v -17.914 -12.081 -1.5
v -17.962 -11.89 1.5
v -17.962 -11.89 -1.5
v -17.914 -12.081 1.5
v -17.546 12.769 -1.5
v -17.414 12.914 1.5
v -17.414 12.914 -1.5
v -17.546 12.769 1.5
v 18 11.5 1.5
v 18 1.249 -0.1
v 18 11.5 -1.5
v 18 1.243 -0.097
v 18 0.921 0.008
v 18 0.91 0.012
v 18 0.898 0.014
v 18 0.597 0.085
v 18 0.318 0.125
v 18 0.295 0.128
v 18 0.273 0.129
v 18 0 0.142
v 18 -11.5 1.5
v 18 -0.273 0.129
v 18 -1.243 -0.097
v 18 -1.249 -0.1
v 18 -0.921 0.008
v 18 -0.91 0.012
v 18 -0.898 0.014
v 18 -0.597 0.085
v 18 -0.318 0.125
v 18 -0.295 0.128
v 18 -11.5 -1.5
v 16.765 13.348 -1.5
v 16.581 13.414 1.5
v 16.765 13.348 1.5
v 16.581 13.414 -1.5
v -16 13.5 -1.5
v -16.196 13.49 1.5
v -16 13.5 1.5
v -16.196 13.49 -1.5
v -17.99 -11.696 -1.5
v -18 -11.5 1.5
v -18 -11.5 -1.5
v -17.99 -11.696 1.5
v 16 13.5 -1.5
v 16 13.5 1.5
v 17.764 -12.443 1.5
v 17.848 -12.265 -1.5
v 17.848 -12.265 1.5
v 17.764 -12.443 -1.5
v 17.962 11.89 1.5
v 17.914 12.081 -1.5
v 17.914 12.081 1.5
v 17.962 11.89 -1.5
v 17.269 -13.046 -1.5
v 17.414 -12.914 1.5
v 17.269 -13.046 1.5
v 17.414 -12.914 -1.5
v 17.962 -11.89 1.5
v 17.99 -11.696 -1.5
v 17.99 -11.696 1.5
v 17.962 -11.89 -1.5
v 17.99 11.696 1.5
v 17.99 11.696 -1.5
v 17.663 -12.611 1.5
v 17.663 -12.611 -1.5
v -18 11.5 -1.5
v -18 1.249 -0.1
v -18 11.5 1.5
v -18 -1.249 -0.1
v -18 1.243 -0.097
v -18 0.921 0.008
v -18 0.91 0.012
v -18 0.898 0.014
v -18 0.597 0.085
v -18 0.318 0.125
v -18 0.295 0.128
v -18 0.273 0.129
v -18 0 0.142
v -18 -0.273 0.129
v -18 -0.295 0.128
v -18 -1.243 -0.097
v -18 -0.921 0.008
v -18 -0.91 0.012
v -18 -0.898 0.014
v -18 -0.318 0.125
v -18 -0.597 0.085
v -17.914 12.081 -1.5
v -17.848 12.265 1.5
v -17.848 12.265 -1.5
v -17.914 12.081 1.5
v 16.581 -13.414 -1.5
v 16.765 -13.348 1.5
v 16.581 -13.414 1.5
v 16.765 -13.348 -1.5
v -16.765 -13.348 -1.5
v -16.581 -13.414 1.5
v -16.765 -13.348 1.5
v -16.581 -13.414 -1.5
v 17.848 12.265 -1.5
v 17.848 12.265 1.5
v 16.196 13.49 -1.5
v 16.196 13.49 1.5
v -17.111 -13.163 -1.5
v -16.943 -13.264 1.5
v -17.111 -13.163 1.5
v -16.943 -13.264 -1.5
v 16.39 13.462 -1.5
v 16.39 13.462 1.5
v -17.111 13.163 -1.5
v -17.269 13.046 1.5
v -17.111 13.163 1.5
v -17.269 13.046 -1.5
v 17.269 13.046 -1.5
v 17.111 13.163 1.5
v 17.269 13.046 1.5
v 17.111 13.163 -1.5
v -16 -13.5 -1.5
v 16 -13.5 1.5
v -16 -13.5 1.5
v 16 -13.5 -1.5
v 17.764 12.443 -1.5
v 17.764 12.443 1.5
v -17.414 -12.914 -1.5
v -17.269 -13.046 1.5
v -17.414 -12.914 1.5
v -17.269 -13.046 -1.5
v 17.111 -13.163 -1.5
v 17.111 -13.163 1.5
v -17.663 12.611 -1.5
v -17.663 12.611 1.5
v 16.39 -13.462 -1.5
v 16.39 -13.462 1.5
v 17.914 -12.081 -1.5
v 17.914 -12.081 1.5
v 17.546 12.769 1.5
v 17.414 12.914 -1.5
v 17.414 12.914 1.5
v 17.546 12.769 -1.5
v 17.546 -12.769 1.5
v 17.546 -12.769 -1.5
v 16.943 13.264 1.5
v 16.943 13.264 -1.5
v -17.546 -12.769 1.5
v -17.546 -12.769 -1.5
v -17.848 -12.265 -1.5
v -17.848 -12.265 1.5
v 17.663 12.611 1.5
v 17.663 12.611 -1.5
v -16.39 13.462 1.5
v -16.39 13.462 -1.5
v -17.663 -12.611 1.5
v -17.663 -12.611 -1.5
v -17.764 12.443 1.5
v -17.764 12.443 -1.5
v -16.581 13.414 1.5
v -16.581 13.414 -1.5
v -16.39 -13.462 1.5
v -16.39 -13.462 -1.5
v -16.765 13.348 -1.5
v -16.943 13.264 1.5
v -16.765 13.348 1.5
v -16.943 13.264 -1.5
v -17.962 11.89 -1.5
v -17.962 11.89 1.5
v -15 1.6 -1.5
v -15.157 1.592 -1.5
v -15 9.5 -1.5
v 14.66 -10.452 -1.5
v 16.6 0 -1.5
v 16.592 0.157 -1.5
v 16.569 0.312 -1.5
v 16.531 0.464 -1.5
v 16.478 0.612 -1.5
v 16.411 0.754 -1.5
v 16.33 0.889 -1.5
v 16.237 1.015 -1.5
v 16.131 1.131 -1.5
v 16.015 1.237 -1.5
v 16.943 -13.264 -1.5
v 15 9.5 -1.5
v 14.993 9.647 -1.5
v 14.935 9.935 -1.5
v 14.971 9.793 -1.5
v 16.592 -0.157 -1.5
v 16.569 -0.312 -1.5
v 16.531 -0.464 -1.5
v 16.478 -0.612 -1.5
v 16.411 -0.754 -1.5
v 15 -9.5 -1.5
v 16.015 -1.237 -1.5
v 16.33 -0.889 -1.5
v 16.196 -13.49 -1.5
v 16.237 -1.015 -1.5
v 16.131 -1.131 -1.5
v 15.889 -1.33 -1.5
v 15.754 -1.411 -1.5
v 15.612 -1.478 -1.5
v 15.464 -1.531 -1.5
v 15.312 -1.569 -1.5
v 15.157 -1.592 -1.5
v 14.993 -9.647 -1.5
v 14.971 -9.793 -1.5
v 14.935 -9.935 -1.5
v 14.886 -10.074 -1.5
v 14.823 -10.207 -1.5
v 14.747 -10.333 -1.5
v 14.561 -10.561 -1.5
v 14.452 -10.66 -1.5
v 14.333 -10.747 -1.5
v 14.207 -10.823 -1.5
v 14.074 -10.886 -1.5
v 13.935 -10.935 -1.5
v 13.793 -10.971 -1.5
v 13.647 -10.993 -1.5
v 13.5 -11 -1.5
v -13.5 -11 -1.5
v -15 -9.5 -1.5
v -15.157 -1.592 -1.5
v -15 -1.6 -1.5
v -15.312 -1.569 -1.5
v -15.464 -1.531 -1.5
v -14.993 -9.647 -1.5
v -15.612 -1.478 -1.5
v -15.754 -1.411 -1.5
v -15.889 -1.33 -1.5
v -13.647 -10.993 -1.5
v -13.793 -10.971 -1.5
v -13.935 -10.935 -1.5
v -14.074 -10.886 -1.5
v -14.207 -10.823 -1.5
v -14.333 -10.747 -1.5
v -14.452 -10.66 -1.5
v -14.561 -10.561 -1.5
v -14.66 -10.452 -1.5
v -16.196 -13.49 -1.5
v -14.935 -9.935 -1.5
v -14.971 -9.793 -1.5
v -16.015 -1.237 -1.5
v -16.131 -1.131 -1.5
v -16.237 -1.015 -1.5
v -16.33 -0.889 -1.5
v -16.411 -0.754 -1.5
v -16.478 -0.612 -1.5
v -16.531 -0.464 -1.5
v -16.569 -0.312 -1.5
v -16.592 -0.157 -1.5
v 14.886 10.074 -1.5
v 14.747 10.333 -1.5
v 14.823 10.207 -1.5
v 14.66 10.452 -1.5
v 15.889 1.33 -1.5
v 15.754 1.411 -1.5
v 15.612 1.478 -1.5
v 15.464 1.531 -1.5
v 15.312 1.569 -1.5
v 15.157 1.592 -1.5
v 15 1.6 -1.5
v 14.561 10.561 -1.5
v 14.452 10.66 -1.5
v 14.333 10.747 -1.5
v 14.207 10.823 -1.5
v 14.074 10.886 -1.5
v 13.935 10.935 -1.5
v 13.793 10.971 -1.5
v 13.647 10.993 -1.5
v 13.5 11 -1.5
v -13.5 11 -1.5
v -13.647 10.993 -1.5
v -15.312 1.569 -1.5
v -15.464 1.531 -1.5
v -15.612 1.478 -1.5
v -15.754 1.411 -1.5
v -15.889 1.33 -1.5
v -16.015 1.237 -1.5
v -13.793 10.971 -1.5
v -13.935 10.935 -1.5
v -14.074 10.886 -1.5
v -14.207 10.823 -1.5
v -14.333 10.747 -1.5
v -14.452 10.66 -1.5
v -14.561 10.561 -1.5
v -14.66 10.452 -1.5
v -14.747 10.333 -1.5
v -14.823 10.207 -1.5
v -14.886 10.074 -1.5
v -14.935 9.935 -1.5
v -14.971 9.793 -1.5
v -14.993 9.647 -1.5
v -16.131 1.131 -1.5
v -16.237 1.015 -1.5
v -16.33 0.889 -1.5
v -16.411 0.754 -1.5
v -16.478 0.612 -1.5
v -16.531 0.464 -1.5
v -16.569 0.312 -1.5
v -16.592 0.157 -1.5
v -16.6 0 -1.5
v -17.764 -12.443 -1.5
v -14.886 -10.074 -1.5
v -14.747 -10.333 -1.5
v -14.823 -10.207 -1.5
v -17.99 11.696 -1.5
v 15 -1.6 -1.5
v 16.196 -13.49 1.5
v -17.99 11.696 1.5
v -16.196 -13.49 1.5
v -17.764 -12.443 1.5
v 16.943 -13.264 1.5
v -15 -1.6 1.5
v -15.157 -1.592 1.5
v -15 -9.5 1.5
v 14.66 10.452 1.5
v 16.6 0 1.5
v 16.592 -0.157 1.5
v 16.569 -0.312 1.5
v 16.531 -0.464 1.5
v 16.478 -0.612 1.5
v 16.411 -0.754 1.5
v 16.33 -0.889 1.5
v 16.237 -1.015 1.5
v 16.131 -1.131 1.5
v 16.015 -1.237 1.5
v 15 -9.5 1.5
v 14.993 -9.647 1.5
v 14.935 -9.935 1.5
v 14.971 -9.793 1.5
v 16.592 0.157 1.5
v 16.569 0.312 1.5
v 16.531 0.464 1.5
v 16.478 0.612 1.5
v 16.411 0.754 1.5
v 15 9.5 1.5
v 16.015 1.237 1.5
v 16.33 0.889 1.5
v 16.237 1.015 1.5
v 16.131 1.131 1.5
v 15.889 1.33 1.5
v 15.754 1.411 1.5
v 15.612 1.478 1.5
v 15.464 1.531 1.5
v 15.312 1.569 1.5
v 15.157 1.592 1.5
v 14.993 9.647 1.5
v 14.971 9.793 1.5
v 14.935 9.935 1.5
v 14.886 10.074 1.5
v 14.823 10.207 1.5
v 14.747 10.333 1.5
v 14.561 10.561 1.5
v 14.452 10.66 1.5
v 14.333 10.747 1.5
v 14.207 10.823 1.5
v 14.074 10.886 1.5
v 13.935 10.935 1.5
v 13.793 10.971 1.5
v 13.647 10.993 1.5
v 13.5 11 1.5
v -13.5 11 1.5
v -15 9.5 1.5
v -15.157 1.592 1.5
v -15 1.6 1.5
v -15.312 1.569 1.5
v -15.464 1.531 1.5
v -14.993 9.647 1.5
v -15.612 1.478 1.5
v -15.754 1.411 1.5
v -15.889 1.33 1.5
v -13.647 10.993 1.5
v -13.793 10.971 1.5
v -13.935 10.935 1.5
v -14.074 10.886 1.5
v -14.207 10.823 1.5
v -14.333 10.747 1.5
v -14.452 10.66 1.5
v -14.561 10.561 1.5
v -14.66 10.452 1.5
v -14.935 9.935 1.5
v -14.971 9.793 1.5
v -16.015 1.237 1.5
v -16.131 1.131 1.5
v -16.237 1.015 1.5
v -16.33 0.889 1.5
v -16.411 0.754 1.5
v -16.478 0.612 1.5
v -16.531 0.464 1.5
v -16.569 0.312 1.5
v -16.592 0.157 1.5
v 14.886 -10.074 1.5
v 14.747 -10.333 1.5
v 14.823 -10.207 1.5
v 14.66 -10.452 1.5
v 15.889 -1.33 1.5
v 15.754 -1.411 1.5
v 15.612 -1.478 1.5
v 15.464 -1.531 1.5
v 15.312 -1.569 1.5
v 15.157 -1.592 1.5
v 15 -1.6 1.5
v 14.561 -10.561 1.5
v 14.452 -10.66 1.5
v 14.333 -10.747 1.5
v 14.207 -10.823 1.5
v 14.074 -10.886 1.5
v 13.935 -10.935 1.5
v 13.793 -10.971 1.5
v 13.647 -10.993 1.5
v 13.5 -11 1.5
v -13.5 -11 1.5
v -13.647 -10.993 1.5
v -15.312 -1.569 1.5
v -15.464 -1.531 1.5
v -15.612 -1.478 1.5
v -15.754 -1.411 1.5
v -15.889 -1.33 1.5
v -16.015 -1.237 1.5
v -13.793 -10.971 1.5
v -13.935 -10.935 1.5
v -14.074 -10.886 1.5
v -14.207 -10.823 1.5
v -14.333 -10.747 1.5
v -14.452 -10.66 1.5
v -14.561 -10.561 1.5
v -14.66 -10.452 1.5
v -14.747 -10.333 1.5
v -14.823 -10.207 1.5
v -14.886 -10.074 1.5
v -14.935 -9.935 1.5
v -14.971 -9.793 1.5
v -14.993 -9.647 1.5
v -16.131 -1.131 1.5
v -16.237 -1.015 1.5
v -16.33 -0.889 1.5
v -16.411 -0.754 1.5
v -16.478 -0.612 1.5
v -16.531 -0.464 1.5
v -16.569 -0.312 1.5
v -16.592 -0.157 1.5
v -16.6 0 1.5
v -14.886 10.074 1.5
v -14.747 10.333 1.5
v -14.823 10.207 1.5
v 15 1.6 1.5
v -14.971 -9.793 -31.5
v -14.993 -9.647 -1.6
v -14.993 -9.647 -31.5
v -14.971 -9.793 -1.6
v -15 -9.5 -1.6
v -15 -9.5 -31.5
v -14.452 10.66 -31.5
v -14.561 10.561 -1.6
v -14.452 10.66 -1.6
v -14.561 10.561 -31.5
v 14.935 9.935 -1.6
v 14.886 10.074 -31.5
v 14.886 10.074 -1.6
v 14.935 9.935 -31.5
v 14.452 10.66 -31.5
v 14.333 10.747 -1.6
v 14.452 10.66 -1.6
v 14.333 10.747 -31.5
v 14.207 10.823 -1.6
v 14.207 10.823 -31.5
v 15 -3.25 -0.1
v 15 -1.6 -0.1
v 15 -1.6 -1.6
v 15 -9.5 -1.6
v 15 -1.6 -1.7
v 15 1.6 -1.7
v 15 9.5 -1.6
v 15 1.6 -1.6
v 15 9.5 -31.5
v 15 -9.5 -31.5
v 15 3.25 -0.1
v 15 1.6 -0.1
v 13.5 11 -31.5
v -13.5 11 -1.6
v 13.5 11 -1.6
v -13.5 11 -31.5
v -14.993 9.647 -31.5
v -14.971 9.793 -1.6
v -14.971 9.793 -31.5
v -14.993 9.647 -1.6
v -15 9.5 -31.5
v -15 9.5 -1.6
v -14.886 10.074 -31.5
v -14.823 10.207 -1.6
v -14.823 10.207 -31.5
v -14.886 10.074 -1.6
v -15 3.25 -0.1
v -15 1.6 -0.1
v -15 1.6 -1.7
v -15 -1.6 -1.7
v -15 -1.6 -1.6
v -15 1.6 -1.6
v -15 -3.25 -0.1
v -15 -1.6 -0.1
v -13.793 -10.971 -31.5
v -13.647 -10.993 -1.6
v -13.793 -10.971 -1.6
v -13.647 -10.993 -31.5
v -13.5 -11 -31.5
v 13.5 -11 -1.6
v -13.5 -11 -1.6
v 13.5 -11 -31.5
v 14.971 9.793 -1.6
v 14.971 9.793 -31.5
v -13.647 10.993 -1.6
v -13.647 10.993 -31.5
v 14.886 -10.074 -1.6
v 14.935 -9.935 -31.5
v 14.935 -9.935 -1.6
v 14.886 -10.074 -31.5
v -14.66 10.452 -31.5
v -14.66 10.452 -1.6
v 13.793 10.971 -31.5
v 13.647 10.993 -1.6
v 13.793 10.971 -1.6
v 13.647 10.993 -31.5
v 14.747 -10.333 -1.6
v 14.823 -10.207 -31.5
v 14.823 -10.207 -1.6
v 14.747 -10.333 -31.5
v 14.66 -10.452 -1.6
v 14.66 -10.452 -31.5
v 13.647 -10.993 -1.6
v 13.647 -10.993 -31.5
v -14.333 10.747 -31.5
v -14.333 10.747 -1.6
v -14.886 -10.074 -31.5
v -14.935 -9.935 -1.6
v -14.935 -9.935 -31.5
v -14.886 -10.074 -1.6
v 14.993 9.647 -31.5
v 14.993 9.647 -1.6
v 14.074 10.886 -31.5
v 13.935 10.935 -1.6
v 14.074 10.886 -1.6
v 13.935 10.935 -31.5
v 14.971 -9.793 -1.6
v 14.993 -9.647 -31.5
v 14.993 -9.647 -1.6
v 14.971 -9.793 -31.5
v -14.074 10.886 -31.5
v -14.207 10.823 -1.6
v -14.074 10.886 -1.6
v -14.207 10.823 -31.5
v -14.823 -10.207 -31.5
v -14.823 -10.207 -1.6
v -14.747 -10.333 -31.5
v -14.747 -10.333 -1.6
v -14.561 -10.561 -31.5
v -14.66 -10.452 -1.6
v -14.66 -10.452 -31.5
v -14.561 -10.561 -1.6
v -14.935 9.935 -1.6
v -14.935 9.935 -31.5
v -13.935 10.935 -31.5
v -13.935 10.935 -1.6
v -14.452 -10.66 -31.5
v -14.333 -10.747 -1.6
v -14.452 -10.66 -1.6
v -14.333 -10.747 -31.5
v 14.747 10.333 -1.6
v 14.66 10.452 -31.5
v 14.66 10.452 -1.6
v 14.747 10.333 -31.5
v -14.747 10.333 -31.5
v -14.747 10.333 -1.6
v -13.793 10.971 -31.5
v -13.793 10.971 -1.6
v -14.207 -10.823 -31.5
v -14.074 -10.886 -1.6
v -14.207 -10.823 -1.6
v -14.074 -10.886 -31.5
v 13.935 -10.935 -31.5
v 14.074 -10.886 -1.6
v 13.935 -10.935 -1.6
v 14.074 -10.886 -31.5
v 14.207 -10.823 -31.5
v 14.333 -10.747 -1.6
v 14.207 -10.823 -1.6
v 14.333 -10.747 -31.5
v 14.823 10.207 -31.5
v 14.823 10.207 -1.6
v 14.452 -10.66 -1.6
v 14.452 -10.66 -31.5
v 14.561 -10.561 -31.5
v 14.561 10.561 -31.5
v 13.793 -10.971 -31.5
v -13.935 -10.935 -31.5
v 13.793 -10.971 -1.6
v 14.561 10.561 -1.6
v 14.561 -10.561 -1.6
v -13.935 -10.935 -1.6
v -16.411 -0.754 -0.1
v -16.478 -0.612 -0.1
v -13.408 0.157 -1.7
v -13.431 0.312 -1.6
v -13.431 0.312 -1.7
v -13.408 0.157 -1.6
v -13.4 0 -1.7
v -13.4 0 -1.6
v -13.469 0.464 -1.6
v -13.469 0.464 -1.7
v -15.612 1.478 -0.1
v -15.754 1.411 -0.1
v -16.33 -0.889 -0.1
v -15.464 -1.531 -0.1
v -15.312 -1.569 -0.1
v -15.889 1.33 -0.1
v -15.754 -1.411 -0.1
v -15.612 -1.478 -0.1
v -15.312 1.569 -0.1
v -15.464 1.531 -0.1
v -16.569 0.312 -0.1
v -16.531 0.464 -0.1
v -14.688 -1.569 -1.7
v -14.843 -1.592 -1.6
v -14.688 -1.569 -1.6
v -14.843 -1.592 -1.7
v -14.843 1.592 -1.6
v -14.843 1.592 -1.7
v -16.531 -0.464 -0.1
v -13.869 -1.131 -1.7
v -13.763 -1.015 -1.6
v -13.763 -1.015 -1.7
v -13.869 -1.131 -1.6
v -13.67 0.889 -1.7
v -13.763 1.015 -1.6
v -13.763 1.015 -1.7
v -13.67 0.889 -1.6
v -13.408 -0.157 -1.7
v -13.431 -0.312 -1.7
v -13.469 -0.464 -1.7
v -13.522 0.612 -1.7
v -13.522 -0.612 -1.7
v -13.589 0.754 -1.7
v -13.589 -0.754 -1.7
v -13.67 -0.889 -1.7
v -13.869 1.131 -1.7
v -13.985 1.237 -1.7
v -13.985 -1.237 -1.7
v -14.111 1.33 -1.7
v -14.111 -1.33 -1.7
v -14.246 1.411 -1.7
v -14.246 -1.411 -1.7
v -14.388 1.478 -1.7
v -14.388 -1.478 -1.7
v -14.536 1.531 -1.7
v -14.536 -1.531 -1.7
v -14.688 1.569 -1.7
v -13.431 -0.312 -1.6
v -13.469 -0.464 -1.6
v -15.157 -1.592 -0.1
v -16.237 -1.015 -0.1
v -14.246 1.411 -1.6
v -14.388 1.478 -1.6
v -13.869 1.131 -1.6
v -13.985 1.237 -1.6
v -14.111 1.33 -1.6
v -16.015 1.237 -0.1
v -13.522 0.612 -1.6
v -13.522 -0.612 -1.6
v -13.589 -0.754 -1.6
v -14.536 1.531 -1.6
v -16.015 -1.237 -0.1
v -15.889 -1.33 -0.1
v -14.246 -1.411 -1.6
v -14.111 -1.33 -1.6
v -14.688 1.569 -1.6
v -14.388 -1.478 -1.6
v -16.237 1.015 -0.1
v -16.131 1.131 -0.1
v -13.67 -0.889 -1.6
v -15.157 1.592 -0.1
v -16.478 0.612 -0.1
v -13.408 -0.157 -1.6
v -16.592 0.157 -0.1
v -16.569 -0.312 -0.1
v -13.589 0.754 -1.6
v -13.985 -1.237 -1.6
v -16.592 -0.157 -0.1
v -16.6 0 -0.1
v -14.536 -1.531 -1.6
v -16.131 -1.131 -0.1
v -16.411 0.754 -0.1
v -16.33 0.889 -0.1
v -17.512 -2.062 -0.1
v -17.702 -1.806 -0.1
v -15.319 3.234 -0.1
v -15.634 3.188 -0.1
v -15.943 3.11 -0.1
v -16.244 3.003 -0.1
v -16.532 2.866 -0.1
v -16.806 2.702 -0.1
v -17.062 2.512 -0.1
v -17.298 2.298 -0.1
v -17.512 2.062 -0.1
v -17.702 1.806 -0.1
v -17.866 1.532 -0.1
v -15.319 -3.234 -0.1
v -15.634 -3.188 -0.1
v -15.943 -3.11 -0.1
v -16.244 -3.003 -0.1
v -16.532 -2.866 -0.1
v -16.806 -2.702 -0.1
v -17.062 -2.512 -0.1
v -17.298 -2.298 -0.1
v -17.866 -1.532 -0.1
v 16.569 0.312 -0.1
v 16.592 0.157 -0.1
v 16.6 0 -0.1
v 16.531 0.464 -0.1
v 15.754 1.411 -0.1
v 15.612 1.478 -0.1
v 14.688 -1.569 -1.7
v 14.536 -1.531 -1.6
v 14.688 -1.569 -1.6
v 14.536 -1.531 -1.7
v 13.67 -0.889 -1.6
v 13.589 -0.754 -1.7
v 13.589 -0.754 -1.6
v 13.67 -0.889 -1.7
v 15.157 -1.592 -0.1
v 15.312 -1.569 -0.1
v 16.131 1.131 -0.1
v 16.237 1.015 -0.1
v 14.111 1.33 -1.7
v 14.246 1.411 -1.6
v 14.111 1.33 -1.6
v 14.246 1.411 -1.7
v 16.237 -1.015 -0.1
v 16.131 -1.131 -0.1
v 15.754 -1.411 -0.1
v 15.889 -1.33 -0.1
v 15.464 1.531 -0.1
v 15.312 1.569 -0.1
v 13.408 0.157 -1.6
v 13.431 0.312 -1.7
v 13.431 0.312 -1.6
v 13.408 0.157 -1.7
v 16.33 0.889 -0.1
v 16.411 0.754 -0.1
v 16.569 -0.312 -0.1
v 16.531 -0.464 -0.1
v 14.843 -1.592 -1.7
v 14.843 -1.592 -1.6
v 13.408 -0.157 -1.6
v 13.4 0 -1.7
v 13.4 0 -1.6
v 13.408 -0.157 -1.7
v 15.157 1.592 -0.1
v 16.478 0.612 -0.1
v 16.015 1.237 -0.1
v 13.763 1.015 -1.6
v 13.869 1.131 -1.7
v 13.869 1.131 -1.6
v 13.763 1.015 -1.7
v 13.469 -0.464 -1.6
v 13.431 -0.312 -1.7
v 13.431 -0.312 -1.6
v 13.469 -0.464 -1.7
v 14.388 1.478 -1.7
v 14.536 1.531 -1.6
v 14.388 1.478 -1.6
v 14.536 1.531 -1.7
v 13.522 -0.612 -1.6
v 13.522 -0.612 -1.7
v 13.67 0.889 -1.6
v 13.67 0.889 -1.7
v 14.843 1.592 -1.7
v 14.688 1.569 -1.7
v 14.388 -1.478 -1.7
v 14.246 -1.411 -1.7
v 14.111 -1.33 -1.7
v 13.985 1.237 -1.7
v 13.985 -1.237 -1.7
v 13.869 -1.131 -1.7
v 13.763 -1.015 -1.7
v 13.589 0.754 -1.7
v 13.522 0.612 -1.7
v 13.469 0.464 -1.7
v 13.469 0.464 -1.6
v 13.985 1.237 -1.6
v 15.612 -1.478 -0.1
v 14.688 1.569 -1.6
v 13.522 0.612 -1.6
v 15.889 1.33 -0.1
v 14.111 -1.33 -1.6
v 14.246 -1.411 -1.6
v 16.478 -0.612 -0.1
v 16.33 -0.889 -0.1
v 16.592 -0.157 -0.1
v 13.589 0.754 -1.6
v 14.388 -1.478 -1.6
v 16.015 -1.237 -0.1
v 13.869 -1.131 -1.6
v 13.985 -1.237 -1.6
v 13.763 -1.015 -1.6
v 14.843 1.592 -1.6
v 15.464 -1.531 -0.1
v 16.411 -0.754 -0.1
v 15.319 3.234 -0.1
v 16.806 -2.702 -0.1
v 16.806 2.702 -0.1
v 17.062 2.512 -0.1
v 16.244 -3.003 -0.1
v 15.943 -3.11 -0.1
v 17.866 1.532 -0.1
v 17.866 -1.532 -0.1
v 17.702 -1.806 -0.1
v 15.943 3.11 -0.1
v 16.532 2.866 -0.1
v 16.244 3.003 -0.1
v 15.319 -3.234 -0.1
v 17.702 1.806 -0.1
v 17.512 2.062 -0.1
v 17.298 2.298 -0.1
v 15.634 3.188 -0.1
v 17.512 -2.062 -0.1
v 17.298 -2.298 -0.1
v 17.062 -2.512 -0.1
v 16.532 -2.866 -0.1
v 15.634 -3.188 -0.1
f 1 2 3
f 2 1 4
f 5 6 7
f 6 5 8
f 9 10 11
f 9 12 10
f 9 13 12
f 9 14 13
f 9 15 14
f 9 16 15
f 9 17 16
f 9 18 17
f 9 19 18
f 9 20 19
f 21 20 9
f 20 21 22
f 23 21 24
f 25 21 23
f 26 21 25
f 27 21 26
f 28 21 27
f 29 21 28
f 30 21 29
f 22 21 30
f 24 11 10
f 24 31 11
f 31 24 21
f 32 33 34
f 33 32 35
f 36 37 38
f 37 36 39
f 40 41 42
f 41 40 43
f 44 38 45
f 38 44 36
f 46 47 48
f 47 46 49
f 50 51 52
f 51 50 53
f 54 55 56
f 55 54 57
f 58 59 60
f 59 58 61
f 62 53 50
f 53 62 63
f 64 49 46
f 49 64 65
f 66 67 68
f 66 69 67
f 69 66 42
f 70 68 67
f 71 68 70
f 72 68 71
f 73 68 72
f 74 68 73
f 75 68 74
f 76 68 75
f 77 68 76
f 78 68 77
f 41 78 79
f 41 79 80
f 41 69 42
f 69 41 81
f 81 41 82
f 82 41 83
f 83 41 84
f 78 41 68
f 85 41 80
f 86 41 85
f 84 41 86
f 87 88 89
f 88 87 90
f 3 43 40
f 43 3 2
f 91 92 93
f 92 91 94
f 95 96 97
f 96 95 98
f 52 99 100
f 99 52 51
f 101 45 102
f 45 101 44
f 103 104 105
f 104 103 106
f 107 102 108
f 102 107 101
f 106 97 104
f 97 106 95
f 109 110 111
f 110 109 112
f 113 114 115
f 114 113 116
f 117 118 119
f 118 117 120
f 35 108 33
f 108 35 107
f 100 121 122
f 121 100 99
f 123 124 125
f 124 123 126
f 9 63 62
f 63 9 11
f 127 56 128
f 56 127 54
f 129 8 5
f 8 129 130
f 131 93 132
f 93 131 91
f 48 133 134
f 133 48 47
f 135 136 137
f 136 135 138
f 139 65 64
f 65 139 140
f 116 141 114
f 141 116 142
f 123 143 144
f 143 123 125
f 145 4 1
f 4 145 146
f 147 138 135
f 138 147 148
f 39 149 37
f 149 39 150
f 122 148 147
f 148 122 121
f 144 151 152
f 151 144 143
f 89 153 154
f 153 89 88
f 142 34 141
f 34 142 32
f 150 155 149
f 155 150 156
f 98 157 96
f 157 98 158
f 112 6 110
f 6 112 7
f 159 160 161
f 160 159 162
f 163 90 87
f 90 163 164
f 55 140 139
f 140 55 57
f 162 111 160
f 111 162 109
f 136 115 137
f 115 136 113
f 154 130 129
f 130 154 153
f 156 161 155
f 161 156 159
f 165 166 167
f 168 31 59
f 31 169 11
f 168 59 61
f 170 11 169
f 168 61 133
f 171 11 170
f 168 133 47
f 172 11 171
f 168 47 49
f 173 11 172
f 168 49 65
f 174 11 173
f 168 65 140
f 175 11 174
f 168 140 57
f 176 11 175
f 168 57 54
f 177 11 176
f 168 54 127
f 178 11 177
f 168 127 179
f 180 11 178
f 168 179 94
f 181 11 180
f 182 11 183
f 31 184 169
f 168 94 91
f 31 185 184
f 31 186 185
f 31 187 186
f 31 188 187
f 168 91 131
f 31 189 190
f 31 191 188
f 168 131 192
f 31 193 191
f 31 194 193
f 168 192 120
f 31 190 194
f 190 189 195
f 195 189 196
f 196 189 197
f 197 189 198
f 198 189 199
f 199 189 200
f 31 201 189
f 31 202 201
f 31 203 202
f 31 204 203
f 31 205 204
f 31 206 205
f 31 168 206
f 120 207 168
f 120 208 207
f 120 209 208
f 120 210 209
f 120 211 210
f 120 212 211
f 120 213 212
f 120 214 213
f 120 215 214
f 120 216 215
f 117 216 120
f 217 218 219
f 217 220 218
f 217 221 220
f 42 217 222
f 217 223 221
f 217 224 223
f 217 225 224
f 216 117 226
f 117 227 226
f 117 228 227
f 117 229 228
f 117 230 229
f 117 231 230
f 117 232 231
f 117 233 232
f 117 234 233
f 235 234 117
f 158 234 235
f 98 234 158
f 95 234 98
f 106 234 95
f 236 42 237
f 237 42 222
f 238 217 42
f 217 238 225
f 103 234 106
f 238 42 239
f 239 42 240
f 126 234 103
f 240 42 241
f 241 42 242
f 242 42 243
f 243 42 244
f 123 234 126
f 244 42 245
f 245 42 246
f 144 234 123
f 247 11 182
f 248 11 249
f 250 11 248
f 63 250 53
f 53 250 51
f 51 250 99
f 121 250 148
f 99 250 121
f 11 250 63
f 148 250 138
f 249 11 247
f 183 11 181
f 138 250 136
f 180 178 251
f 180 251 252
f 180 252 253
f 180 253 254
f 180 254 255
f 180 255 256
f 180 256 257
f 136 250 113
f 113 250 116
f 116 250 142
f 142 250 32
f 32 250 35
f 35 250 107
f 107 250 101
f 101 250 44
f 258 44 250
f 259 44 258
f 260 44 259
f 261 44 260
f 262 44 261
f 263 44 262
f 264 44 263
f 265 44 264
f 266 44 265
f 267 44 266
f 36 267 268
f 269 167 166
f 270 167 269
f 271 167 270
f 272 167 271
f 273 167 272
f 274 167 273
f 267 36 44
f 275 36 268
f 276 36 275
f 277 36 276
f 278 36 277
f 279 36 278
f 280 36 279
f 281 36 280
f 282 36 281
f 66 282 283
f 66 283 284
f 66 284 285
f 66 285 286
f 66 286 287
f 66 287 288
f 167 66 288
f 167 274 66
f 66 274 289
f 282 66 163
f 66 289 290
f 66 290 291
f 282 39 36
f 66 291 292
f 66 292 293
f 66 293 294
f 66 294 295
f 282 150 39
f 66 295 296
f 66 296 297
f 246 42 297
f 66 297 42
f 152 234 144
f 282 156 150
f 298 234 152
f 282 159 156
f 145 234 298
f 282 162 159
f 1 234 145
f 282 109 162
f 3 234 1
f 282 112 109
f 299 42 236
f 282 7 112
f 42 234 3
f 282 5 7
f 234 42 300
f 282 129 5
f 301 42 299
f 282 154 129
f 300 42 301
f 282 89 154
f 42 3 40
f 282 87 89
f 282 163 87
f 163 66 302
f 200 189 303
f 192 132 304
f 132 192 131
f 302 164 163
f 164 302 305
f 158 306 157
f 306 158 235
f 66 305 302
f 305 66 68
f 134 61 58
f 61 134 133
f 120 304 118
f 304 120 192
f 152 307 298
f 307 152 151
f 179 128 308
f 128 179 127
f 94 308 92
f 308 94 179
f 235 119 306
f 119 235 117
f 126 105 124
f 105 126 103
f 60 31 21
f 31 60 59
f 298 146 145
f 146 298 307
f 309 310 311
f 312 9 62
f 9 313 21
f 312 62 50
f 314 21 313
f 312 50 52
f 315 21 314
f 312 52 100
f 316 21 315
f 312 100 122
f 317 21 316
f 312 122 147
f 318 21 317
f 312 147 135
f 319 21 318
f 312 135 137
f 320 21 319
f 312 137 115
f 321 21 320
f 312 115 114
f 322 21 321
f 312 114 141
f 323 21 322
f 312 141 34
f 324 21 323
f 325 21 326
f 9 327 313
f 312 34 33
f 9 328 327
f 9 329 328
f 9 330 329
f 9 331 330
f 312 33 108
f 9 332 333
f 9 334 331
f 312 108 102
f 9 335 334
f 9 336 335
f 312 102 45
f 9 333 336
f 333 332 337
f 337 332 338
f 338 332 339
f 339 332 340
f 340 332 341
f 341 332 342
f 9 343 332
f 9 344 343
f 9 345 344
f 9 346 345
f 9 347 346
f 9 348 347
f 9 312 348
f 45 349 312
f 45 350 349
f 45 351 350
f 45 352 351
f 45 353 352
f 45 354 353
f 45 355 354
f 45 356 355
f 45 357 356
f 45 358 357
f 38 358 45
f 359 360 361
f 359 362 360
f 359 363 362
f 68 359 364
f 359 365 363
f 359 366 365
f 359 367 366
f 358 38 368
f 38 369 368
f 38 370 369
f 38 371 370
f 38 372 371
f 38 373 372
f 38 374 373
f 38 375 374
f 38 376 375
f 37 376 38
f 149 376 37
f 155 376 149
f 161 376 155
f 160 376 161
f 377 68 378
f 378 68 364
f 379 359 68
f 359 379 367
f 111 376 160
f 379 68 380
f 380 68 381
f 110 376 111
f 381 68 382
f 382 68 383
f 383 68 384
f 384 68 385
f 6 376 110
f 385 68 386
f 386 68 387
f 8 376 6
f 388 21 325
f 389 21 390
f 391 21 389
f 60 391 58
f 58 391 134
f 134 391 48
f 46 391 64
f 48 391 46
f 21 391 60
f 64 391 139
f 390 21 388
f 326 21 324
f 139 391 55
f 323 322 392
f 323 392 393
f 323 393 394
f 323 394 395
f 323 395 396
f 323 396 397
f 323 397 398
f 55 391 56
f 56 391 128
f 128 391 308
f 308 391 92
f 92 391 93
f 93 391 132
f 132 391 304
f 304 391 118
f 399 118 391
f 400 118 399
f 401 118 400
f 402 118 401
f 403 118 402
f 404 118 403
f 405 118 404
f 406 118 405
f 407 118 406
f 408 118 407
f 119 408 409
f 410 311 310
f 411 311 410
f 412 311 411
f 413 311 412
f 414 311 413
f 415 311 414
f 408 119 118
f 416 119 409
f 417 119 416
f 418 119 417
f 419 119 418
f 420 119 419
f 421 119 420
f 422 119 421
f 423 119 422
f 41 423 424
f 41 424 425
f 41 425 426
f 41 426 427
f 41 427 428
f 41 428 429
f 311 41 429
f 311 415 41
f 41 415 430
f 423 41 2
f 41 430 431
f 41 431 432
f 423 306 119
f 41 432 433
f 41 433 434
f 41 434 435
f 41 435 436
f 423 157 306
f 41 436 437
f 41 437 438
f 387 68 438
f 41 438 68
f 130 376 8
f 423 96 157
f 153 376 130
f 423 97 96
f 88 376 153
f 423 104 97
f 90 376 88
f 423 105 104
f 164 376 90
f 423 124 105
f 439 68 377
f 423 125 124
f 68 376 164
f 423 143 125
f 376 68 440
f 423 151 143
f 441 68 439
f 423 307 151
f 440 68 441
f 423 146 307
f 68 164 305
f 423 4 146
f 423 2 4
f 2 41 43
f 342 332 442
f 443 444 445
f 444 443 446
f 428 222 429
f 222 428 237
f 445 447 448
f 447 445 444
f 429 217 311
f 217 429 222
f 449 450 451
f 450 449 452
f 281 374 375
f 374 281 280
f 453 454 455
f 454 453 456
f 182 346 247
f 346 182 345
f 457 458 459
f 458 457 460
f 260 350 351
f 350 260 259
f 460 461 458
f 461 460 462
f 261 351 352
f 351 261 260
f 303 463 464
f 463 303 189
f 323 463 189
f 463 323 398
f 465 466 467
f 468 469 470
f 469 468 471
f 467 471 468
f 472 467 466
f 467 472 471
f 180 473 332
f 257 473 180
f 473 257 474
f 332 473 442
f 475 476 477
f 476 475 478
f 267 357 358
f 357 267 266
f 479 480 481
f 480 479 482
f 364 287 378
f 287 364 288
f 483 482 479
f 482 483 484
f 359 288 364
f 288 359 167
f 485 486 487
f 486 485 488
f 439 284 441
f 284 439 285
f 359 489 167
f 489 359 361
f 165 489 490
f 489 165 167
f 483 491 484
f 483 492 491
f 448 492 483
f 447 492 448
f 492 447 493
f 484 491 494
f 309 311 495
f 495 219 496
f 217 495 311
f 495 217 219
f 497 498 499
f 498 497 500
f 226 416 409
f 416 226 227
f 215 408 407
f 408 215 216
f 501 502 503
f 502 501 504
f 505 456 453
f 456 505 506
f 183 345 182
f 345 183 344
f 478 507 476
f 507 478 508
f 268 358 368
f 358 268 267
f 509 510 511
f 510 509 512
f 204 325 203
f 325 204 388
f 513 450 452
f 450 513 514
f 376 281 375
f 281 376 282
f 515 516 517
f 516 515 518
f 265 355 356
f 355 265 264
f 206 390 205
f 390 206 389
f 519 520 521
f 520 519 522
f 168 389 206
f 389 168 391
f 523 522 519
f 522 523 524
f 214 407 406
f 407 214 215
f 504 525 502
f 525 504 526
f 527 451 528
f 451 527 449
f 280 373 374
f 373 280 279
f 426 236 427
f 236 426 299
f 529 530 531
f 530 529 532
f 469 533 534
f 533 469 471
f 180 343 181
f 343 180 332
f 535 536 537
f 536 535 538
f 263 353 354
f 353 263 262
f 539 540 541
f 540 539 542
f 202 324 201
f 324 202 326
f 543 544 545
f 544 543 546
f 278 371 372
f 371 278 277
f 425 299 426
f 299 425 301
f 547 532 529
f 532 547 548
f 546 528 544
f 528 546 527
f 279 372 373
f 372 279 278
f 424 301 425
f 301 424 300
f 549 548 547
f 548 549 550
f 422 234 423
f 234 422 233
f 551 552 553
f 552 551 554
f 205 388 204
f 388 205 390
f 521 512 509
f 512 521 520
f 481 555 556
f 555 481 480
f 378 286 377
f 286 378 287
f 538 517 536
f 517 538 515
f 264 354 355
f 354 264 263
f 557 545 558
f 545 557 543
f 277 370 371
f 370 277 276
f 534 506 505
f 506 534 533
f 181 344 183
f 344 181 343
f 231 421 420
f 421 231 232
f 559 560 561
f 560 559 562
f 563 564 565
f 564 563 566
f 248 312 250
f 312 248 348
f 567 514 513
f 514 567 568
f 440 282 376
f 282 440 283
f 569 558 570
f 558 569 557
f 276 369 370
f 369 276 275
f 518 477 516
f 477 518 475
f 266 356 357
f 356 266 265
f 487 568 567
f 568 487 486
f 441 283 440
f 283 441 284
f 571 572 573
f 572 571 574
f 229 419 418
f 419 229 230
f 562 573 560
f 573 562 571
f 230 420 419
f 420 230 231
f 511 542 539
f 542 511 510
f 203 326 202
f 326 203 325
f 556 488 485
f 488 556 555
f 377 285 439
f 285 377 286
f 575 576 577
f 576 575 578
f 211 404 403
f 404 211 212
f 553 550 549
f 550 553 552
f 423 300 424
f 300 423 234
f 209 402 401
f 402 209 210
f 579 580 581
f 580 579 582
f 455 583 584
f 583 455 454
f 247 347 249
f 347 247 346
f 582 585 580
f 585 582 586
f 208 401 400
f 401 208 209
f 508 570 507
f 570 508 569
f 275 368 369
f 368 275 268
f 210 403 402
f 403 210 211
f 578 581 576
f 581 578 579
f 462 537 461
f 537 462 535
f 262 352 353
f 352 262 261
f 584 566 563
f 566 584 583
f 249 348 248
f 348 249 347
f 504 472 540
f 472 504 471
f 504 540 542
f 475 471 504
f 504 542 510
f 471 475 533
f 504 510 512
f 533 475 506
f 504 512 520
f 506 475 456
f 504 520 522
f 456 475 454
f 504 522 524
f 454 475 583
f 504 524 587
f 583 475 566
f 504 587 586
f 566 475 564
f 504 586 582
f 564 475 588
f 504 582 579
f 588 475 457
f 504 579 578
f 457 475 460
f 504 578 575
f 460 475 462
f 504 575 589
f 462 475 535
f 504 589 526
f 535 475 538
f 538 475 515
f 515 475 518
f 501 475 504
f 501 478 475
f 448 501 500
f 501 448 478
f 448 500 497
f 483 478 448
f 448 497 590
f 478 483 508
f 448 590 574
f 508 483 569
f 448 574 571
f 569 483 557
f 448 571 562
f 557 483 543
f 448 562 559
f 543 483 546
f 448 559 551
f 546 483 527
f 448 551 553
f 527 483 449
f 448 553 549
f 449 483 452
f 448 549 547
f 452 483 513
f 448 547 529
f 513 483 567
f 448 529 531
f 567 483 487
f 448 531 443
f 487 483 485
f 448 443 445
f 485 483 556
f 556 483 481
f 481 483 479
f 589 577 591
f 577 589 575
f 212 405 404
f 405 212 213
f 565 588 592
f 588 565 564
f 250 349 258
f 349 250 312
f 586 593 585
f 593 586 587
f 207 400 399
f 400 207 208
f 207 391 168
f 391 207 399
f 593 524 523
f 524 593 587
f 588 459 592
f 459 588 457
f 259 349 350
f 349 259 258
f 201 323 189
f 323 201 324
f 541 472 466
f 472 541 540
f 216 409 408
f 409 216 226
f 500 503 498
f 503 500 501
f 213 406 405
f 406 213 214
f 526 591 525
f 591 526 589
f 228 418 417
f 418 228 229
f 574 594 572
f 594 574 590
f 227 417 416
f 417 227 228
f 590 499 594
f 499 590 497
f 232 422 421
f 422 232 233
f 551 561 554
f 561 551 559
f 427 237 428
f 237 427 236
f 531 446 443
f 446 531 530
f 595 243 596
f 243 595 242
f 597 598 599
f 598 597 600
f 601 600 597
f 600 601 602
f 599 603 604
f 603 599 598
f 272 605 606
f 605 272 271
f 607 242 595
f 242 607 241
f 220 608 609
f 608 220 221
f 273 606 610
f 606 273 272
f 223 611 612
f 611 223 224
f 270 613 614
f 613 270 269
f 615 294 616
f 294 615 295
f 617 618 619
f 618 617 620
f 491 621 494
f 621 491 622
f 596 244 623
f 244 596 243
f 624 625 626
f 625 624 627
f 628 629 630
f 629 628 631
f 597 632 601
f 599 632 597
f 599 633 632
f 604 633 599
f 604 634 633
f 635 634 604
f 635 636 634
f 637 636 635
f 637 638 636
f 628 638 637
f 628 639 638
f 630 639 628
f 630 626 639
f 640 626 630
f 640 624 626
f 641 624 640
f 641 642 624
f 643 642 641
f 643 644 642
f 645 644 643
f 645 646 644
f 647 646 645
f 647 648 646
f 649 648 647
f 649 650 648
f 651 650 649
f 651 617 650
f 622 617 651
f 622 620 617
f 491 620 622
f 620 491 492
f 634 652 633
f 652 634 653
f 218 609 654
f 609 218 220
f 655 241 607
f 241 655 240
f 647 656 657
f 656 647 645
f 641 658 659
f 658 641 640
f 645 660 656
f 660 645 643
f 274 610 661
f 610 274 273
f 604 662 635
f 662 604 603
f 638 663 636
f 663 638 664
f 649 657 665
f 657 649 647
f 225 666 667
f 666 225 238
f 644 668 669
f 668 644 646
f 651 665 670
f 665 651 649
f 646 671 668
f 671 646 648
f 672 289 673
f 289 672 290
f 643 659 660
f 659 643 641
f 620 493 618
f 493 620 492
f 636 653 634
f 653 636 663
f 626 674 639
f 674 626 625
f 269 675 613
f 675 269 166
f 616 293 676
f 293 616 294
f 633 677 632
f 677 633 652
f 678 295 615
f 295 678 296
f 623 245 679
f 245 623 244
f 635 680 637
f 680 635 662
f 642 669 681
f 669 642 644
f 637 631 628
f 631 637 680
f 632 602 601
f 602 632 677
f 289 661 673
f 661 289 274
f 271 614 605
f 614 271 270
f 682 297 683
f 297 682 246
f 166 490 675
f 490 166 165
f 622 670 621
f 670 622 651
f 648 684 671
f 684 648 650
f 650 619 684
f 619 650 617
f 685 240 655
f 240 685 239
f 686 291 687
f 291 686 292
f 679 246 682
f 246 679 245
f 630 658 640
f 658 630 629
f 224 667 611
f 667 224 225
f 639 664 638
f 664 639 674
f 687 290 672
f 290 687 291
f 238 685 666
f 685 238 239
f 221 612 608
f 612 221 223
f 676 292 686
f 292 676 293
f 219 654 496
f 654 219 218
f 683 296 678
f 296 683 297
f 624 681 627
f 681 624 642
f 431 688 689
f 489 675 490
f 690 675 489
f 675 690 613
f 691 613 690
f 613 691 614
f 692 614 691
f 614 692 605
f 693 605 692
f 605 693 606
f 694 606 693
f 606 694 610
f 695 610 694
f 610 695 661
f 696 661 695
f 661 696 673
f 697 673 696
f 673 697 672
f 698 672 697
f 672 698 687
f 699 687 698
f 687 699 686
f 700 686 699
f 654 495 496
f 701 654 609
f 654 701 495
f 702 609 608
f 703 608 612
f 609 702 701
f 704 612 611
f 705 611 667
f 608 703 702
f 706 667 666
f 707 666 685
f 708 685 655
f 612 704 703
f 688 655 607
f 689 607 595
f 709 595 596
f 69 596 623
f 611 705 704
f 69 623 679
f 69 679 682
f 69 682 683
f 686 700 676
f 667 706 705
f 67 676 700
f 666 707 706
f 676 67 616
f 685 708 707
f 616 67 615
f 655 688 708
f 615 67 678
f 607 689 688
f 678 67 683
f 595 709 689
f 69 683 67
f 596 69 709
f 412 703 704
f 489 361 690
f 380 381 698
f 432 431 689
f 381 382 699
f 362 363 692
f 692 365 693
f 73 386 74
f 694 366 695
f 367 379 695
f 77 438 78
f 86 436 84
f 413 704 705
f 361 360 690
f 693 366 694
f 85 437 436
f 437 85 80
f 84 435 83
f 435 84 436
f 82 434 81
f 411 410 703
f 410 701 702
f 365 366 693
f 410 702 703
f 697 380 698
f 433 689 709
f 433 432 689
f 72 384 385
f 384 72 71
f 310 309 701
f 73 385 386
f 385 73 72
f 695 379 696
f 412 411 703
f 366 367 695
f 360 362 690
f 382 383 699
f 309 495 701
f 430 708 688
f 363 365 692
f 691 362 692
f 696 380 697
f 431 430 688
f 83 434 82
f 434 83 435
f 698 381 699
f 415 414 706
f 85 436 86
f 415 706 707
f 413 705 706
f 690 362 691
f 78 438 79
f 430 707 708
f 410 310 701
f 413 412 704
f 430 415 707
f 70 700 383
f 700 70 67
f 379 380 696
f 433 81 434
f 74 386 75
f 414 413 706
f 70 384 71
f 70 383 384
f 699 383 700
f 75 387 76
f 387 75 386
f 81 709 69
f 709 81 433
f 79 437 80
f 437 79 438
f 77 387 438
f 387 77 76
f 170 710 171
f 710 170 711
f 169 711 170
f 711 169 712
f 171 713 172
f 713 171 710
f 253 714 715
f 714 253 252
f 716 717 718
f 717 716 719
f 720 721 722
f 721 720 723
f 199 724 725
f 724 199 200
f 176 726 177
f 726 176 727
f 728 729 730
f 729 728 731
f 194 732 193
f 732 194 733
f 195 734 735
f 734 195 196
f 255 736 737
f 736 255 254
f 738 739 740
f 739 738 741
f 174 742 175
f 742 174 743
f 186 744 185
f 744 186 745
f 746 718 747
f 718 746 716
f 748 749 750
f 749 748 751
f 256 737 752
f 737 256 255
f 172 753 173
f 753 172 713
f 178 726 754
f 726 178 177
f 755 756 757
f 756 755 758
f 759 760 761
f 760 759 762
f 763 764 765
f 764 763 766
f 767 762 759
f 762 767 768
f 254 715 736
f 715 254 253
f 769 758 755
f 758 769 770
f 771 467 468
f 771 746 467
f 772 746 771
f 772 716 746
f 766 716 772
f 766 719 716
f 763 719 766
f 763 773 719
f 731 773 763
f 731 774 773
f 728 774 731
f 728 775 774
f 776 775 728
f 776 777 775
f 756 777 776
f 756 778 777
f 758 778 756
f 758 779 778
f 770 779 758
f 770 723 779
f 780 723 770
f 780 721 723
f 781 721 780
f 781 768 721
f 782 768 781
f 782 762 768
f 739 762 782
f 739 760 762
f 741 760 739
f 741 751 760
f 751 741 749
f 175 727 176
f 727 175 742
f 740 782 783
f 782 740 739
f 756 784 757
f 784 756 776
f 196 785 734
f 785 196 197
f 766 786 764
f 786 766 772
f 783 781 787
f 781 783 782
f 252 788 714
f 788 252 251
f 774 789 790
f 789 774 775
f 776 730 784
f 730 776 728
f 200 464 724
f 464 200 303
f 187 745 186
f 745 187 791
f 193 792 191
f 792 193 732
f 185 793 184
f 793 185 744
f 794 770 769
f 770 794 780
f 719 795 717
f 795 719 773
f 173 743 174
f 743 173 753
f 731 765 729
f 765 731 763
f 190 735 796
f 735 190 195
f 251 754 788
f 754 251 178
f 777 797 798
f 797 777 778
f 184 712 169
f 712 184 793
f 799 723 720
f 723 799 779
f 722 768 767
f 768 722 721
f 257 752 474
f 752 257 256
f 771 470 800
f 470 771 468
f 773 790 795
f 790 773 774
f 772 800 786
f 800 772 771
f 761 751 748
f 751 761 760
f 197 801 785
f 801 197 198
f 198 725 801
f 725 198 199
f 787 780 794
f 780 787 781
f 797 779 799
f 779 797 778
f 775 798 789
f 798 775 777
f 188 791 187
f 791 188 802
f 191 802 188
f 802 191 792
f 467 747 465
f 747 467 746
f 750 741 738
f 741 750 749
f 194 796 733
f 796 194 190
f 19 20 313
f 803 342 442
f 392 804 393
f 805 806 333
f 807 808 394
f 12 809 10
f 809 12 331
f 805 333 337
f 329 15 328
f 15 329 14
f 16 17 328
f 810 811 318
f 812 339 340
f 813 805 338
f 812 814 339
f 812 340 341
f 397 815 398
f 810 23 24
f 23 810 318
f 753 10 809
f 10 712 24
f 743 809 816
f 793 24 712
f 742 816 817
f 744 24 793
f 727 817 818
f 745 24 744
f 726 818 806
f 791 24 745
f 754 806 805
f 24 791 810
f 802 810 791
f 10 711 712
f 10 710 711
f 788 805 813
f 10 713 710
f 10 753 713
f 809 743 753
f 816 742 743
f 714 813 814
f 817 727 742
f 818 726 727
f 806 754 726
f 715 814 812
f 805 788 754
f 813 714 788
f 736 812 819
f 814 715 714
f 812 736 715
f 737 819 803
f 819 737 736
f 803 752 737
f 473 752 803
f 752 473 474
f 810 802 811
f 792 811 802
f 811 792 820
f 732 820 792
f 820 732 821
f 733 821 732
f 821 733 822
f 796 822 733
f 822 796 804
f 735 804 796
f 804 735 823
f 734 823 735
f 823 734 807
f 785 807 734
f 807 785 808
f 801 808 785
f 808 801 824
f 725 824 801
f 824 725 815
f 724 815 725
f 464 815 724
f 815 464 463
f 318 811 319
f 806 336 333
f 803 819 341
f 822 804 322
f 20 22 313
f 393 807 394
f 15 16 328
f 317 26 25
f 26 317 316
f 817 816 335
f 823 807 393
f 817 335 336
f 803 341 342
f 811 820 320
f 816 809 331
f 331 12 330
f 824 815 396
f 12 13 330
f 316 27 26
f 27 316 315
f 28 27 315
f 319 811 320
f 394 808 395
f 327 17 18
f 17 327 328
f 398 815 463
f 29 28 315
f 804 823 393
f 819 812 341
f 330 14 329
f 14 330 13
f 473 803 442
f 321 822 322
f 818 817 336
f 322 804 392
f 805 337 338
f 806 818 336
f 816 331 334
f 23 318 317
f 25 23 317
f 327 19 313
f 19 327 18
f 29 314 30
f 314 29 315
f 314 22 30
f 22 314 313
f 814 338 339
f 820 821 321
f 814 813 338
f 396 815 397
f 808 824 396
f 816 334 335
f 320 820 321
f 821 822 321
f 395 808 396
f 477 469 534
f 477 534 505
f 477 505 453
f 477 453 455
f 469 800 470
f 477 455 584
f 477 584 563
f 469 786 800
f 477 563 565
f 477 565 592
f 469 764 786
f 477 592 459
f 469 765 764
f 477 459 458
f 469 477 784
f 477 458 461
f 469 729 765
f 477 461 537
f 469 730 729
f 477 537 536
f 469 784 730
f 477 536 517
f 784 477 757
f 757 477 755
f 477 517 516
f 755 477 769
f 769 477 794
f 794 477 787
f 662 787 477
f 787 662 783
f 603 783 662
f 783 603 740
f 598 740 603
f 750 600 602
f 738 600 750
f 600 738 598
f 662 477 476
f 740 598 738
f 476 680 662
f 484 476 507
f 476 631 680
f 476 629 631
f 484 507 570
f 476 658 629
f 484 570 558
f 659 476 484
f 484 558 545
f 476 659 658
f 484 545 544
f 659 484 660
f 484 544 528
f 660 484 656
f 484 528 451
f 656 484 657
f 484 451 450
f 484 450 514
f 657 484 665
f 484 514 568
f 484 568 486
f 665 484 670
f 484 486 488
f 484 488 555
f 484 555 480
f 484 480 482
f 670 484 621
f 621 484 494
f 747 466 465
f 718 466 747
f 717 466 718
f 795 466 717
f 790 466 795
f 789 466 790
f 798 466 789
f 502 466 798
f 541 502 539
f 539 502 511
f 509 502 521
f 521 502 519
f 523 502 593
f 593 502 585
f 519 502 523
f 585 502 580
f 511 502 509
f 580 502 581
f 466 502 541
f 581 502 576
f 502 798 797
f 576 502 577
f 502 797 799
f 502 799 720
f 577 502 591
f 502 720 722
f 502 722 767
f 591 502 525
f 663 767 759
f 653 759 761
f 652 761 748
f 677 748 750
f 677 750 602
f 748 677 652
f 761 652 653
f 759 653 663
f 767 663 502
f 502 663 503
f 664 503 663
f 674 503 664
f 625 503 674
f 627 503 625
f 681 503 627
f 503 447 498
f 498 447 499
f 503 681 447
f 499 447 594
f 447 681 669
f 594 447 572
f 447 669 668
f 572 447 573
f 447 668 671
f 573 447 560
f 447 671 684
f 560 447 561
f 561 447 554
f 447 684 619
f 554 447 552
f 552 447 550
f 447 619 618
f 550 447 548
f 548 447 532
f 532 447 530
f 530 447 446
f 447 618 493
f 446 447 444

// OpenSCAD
$fn=64;

module rounded_rect_2d(w, h, r){
    r2 = min(r, min(w,h)/2);
    hull(){
        translate([ w/2 - r2,  h/2 - r2]) circle(r=r2);
        translate([-w/2 + r2,  h/2 - r2]) circle(r=r2);
        translate([-w/2 + r2, -h/2 + r2]) circle(r=r2);
        translate([ w/2 - r2, -h/2 + r2]) circle(r=r2);
    }
}

module slot_2d(len, wid){
    hull(){
        translate([ len/2 - wid/2, 0]) circle(d=wid);
        translate([-len/2 + wid/2, 0]) circle(d=wid);
    }
}

module iec_inlet_jr101_1f_panel_cutout(
    face_w=36.0,
    face_h=27.0,
    face_t=3.0,
    body_depth=30.0,
    flange_r=2.0,
    cut_w=30.0,
    cut_h=22.0,
    cut_r=1.5,
    screw_hole_d=3.2,
    screw_spacing=30.0,
    screw_offset_y=0.0,
    screw_csk_d=6.5,
    screw_csk_h=1.6
){
    difference(){
        union(){
            linear_extrude(height=face_t, center=true)
                rounded_rect_2d(face_w, face_h, flange_r);

            translate([0,0,-(face_t/2 + body_depth/2)])
                linear_extrude(height=body_depth, center=true)
                    rounded_rect_2d(cut_w, cut_h, cut_r);
        }

        translate([0,0,0])
            linear_extrude(height=face_t + 0.2, center=true)
                rounded_rect_2d(cut_w, cut_h, cut_r);

        for(x=[-screw_spacing/2, screw_spacing/2]){
            translate([x, screw_offset_y, 0])
                cylinder(d=screw_hole_d, h=face_t + 0.4, center=true);

            translate([x, screw_offset_y, face_t/2 - screw_csk_h/2])
                cylinder(d1=screw_csk_d, d2=screw_hole_d, h=screw_csk_h, center=true);
        }
    }
}

iec_inlet_jr101_1f_panel_cutout();
